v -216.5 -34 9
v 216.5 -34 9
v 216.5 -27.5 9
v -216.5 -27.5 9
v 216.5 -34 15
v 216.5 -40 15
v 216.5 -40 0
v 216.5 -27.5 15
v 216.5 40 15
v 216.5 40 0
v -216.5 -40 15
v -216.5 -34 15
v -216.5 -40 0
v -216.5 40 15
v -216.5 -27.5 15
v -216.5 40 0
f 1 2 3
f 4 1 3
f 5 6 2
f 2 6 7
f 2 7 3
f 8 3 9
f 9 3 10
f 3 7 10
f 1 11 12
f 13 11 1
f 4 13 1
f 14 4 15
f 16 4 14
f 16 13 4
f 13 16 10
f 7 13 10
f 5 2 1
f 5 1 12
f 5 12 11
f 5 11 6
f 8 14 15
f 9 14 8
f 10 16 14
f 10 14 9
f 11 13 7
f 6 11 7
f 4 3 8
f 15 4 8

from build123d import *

# Parameters (mm, degrees)
SKETCH_W          = 433
SKETCH_H          = 80
PAD_DEPTH         = 15
SKETCH001_W       = 6.5
SKETCH001_H       = 6
POCKET_DEPTH      = 216.501
POCKET_DEPTH_BACK = -216.501


with BuildPart() as part:
    # Sketch → Pad (new body)
    with BuildSketch(Plane.XY):
        Rectangle(SKETCH_W, SKETCH_H)
    extrude(amount=PAD_DEPTH)

    # Sketch001 → Pocket (cut, two sides)
    with BuildSketch(Plane.YZ) as pocket_sk:
        with Locations((-30.75, 12)):
            Rectangle(SKETCH001_W, SKETCH001_H)
    extrude(amount=-POCKET_DEPTH, mode=Mode.SUBTRACT)
    extrude(pocket_sk.sketch, amount=-POCKET_DEPTH_BACK, mode=Mode.SUBTRACT)


solid = part.part
